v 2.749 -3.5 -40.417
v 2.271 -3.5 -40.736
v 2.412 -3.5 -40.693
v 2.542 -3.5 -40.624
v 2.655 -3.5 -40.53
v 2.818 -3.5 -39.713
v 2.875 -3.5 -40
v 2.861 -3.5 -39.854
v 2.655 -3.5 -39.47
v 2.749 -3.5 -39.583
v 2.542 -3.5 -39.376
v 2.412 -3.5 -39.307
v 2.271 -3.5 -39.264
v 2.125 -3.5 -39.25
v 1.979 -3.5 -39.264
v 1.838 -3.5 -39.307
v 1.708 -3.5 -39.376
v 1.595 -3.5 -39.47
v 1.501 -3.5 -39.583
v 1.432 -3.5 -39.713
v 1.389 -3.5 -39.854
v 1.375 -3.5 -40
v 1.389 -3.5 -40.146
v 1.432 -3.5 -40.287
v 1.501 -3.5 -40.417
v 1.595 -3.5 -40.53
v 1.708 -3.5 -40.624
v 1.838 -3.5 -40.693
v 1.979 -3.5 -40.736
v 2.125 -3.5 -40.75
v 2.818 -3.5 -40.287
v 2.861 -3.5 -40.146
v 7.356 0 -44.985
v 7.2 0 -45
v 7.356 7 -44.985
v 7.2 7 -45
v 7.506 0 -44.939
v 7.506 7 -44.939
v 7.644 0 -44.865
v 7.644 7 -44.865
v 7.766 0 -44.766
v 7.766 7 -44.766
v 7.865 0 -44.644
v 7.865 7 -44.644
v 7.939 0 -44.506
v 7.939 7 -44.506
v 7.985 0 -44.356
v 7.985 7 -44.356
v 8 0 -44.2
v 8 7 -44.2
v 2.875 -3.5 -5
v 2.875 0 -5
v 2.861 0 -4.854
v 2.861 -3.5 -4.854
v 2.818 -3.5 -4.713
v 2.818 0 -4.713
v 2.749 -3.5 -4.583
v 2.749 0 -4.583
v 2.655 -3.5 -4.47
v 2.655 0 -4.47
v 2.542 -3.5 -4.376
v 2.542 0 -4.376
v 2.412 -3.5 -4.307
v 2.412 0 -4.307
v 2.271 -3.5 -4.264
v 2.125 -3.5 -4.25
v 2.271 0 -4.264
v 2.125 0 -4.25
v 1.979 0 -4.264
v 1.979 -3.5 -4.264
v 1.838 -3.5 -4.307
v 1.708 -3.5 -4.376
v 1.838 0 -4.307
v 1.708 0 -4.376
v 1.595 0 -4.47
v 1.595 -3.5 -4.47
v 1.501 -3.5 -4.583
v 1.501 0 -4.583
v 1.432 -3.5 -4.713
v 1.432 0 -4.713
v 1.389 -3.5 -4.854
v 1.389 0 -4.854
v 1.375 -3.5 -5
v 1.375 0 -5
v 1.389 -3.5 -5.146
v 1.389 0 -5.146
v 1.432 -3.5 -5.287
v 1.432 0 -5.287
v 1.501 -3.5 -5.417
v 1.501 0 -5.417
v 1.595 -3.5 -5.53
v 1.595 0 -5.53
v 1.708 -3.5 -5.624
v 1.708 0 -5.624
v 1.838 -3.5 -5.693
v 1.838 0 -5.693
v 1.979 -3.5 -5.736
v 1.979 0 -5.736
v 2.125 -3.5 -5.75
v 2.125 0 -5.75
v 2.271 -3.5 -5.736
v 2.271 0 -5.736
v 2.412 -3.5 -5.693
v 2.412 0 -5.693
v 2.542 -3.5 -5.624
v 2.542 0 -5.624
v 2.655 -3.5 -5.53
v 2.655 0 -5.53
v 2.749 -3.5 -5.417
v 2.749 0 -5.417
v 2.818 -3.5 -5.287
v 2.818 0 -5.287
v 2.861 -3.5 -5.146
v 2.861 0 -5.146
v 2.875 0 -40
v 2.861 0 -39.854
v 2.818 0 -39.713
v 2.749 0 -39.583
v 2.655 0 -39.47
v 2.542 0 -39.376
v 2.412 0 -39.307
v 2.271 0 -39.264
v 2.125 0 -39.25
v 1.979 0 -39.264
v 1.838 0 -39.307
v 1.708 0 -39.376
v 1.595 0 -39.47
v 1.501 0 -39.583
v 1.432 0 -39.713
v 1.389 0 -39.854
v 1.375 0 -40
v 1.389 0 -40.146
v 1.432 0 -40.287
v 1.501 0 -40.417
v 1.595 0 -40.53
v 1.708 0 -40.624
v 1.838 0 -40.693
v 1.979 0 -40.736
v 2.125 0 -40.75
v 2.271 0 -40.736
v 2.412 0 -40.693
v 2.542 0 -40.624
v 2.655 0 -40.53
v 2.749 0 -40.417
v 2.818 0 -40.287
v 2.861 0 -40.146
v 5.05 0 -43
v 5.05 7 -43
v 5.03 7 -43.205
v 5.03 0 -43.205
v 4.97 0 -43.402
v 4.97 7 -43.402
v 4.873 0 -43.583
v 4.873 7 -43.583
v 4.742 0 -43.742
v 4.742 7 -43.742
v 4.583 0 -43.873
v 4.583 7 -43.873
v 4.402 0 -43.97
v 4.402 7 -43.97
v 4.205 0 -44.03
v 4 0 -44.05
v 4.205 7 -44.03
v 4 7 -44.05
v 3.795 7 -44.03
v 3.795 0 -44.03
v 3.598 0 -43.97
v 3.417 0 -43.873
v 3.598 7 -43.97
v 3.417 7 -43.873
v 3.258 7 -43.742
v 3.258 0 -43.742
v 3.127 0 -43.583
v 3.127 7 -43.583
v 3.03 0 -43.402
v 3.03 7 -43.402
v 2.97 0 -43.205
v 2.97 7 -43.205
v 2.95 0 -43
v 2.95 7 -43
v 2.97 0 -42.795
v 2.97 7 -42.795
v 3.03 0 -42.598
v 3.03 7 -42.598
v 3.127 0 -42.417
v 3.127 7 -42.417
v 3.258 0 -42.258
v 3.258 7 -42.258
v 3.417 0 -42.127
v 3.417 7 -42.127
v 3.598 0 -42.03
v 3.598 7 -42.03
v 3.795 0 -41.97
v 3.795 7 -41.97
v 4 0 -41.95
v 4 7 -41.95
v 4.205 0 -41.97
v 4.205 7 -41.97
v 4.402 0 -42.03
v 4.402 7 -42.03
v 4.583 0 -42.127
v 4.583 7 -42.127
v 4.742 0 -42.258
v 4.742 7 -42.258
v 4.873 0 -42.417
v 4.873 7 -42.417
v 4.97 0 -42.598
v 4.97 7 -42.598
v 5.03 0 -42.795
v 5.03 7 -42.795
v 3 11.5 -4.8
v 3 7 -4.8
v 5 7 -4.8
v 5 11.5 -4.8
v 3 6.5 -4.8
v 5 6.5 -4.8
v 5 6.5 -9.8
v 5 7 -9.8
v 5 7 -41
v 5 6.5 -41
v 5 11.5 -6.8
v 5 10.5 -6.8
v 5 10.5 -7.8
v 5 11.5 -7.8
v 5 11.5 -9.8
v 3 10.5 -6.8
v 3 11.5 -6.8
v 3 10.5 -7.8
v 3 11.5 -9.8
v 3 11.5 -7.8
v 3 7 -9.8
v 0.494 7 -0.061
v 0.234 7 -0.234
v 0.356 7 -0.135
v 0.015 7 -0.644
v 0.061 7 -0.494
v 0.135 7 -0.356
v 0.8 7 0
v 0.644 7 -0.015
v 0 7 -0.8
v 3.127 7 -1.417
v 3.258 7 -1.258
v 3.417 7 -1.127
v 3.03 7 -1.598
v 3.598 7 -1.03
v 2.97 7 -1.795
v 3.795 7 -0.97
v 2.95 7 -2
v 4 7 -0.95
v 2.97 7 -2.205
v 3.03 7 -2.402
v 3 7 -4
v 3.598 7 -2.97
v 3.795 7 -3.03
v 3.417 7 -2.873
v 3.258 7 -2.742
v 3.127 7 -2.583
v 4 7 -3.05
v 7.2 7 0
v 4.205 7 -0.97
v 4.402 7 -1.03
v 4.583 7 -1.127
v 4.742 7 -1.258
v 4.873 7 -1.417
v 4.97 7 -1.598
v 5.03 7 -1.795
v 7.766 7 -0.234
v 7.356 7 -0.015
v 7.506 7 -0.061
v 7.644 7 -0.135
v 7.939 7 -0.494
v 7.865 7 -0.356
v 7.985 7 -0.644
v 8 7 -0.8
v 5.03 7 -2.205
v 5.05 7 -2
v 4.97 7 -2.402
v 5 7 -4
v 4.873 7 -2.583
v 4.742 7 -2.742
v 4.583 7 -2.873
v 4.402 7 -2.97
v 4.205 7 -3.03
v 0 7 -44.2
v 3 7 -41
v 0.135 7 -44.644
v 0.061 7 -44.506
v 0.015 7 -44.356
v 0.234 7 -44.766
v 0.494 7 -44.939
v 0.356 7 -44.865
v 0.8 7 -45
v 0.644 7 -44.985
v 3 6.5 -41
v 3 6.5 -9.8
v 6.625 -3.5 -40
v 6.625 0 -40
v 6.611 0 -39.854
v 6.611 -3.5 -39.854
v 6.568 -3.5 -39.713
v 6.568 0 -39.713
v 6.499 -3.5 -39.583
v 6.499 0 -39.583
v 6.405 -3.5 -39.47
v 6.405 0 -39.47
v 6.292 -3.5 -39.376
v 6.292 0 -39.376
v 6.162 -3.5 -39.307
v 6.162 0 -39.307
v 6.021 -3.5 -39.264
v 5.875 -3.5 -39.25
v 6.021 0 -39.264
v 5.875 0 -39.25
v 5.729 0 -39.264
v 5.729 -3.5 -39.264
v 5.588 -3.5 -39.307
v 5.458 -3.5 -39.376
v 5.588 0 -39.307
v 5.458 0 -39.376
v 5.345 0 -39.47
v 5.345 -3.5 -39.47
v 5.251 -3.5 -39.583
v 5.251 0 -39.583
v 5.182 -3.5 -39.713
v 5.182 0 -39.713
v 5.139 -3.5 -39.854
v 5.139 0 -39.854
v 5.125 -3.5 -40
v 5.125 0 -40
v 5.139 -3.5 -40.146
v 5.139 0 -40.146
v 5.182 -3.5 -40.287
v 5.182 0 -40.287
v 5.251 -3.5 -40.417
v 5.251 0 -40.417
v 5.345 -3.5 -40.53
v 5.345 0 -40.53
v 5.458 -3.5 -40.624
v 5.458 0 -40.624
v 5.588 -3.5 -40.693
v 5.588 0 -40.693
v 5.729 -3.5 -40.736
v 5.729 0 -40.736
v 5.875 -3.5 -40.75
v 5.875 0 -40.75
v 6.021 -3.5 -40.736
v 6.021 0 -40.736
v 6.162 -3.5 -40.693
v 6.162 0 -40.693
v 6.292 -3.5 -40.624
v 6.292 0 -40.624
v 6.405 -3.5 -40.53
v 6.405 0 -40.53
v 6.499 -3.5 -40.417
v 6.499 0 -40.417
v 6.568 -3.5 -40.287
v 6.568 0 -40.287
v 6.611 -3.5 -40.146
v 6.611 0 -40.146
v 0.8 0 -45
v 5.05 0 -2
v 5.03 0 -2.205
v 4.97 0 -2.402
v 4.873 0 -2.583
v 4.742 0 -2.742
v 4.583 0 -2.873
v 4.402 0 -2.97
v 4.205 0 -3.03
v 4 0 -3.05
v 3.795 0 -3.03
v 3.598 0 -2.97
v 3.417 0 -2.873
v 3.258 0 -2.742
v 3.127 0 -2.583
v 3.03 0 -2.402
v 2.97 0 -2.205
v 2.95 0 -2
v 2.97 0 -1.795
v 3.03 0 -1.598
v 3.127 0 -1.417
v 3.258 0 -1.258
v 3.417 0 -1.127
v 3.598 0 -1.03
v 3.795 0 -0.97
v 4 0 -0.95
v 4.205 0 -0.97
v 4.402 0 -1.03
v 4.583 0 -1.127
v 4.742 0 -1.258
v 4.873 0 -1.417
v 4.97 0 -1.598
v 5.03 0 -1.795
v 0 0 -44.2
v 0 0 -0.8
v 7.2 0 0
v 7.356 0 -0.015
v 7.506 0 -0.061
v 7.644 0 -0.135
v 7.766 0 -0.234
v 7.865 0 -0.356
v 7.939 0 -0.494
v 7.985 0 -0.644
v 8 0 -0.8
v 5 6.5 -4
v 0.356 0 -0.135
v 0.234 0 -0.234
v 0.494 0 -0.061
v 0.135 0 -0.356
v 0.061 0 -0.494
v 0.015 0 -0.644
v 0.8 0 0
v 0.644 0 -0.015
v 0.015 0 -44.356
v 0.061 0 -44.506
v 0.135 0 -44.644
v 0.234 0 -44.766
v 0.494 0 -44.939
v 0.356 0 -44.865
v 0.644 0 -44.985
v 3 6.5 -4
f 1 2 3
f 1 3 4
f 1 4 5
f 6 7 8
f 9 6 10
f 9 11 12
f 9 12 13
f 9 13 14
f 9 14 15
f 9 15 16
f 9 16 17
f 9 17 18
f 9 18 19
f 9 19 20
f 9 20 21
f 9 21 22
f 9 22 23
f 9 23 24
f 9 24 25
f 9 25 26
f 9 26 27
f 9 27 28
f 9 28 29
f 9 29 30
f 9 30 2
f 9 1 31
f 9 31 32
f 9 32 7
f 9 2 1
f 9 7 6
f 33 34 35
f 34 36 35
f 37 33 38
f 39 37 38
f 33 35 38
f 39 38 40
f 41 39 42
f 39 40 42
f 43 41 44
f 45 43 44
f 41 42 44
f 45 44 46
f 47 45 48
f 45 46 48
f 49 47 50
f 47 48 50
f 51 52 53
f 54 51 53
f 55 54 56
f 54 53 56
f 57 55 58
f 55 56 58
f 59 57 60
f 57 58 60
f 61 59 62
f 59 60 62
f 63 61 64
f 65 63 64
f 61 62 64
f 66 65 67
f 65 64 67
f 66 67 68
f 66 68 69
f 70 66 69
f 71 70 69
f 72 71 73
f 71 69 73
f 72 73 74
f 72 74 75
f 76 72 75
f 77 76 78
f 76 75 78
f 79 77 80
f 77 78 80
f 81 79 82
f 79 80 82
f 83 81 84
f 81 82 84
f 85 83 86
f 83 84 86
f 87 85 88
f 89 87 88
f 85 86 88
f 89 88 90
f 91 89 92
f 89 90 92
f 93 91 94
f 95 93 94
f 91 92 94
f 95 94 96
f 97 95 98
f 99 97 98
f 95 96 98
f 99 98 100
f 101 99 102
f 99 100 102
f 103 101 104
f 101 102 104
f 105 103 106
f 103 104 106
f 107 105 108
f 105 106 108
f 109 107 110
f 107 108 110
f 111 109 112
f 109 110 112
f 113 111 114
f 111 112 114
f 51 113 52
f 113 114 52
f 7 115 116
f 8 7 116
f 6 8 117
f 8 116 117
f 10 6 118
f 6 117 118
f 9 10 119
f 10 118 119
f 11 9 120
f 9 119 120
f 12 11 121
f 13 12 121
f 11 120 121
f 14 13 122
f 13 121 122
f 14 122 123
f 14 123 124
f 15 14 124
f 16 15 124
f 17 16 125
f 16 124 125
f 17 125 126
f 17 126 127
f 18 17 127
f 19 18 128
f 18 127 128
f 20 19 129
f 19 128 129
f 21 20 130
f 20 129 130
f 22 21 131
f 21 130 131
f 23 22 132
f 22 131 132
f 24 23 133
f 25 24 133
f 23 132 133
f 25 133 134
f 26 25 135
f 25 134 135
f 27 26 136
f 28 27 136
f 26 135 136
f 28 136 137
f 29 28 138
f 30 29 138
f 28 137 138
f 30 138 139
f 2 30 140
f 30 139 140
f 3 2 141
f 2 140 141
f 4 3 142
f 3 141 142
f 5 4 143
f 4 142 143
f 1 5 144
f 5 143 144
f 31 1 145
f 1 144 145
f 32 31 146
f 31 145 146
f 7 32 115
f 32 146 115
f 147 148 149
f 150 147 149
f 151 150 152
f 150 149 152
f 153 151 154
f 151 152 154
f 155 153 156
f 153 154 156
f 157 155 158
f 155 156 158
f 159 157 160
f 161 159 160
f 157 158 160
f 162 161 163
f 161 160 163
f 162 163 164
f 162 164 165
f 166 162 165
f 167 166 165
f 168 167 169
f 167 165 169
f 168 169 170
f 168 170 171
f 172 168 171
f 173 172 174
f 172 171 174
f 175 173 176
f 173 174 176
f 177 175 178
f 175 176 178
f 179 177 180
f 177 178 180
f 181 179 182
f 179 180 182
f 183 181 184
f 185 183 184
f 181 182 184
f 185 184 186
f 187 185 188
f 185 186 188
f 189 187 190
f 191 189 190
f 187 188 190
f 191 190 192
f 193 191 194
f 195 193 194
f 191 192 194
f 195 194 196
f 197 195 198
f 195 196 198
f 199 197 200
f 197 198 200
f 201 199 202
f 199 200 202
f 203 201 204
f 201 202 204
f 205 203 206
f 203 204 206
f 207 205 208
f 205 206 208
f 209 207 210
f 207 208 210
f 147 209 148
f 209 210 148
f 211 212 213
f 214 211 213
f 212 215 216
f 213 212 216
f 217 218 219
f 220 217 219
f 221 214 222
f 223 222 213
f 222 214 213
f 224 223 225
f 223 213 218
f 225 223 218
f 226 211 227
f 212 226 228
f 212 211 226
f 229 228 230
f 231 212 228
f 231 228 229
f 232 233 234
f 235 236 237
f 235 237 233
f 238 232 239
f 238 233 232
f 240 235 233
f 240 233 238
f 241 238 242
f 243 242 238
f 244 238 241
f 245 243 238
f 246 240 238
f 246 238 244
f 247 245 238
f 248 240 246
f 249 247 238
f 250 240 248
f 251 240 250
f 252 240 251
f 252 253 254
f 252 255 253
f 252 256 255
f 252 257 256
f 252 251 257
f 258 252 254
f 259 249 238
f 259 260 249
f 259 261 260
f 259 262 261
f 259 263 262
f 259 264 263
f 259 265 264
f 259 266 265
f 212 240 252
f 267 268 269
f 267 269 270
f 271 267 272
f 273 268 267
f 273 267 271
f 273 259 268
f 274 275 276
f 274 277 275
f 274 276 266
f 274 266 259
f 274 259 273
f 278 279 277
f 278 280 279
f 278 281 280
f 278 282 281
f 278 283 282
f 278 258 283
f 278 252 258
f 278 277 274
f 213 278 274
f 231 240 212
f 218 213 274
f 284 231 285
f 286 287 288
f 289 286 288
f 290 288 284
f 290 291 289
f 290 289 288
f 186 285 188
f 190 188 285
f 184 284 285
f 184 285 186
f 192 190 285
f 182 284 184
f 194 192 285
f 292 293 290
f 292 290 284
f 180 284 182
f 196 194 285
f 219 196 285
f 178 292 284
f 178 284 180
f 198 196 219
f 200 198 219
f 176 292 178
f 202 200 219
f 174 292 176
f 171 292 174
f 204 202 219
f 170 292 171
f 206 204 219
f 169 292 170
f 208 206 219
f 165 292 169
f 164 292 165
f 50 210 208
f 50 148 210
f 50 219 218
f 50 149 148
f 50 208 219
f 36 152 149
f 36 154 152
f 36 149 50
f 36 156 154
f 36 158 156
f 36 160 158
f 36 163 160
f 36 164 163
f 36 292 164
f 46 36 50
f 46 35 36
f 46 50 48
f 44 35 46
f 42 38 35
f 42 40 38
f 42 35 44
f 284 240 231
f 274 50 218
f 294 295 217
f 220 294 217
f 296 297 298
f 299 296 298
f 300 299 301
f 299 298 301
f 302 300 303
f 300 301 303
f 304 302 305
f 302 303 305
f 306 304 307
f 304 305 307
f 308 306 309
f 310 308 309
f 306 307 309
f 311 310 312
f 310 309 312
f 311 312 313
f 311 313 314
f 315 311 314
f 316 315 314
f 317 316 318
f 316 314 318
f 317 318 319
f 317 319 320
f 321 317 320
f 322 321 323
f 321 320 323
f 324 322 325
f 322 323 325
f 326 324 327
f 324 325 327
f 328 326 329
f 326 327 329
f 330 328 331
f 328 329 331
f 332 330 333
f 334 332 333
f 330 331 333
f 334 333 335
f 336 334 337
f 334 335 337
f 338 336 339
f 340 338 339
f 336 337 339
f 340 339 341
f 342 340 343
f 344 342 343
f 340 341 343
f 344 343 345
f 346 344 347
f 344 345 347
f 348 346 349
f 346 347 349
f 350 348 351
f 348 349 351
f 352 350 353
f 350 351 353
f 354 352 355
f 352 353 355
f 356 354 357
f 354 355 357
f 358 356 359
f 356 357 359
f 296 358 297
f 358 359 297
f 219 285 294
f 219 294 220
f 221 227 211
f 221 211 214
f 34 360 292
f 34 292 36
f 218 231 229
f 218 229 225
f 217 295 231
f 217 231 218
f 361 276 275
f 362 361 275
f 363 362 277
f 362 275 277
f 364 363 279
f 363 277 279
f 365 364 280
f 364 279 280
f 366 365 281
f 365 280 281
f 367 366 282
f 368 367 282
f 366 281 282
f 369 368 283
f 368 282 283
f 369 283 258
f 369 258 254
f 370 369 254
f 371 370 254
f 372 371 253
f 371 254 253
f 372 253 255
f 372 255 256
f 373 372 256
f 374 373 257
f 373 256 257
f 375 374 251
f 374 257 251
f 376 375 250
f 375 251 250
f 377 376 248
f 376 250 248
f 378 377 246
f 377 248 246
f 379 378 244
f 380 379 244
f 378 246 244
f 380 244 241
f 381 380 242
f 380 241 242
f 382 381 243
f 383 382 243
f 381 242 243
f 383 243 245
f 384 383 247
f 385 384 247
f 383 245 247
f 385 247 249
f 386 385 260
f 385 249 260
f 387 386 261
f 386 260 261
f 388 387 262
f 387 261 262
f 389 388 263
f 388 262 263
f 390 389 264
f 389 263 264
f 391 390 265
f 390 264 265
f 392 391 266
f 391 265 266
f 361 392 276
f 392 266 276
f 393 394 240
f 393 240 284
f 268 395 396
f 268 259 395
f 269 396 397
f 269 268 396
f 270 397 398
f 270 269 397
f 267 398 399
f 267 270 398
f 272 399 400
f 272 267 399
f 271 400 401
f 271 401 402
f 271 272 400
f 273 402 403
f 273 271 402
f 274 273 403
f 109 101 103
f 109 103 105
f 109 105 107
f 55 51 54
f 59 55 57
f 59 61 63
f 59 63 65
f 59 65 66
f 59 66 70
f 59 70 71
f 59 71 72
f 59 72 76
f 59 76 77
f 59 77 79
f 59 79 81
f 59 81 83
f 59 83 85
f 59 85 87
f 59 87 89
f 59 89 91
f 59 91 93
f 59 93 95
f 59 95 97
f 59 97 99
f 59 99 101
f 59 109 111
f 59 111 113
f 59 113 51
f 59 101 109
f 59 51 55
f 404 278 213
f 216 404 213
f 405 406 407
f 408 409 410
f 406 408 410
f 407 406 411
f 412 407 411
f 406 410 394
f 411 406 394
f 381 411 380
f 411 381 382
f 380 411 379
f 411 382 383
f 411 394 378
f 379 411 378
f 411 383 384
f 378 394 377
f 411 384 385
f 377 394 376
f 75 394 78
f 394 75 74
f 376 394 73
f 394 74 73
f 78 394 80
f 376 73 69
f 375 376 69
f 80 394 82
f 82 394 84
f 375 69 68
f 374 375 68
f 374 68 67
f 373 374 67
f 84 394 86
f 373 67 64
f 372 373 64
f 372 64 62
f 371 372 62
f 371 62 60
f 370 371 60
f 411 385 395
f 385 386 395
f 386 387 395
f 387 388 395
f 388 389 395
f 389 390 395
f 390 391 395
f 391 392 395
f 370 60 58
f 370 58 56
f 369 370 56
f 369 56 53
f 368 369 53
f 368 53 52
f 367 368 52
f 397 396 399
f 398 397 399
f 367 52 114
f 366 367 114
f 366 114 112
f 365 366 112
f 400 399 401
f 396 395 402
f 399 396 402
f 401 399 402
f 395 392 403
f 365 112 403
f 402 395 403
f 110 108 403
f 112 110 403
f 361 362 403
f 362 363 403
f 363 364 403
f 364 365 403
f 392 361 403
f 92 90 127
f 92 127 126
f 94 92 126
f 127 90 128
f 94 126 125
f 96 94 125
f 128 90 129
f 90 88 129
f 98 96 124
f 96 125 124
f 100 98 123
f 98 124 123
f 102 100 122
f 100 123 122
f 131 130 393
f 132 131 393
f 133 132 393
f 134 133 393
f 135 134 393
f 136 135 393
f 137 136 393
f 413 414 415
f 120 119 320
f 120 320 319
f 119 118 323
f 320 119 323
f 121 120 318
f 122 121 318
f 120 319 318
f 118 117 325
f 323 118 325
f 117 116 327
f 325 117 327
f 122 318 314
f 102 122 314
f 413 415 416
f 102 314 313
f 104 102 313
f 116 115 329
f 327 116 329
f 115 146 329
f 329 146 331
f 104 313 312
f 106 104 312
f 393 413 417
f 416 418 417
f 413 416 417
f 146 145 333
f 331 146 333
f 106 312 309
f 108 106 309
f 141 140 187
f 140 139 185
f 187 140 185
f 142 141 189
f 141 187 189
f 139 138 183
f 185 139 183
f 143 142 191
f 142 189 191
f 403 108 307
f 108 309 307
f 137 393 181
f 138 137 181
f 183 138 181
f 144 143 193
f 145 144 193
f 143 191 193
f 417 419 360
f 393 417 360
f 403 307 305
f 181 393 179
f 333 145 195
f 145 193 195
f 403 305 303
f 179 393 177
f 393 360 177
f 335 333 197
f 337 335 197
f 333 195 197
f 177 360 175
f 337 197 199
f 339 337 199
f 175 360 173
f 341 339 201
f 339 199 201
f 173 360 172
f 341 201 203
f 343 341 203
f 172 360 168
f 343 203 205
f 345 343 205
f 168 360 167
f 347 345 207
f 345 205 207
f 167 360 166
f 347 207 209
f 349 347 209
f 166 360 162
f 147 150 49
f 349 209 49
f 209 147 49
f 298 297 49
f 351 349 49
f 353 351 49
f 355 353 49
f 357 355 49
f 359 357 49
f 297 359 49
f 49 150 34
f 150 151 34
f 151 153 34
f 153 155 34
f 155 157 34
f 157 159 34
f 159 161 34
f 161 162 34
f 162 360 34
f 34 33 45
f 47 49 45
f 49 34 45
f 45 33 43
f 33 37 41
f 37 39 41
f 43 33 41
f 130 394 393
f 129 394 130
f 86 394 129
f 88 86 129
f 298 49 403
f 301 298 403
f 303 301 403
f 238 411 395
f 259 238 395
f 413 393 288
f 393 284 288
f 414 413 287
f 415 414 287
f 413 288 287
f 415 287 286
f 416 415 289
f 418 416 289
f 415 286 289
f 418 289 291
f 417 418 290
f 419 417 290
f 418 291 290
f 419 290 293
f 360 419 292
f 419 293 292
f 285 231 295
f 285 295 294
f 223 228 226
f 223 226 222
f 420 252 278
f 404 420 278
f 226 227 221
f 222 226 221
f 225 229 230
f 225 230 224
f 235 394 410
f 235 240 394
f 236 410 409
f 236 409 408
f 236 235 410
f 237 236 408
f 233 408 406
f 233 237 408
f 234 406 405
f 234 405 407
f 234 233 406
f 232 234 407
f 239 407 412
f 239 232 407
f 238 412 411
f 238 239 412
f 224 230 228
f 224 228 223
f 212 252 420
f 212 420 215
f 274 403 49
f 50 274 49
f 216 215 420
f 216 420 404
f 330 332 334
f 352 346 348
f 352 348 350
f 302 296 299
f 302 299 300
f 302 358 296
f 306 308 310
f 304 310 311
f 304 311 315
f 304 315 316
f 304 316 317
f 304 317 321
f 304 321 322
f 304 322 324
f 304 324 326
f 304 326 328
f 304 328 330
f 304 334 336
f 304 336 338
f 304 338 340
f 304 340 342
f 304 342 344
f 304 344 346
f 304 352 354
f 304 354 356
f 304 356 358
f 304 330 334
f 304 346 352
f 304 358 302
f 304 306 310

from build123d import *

# Parameters (mm, degrees)
SZKIC1_W                    = 8
SZKIC1_H                    = 45
DODANIE_WYCI_GNI_CIE1_DEPTH = 7
SZKIC2_R                    = 1.05
WYTNIJ_WYCI_GNI_CIE1_DEPTH  = 7
SZKIC3_W                    = 2
SZKIC3_H                    = 37
WYTNIJ_WYCI_GNI_CIE2_DEPTH  = 0.5
SZKIC4_W                    = 2
SZKIC4_H                    = 5
DODANIE_WYCI_GNI_CIE4_DEPTH = 5
SZKIC13_R                   = 0.75
DODANIE_WYCI_GNI_CIE7_DEPTH = 3.5
ZAOKR_GLENIE1_R             = 0.8
SZKIC14_W                   = 2
SZKIC14_H                   = 1
WYTNIJ_WYCI_GNI_CIE3_DEPTH  = 1


with BuildPart() as part:
    # Szkic1 → Dodanie-wyciągnięcie1 (new body)
    with BuildSketch(Plane(origin=(0, 0, 0), x_dir=(1, 0, 0), z_dir=(0, 1, 0))):
        with Locations((4, 22.5)):
            Rectangle(SZKIC1_W, SZKIC1_H)
    extrude(amount=DODANIE_WYCI_GNI_CIE1_DEPTH)

    # Szkic2 → Wytnij-wyciągnięcie1 (cut)
    with BuildSketch(Plane(origin=(0, 7, 0), x_dir=(1, 0, 0), z_dir=(0, 1, 0))):
        with Locations((4, 2)):
            Circle(SZKIC2_R)
        with Locations((4, 43)):
            Circle(SZKIC2_R)
    extrude(amount=-WYTNIJ_WYCI_GNI_CIE1_DEPTH, mode=Mode.SUBTRACT)

    # Szkic3 → Wytnij-wyciągnięcie2 (cut)
    with BuildSketch(Plane(origin=(0, 7, 0), x_dir=(1, 0, 0), z_dir=(0, 1, 0))):
        with Locations((4, 22.5)):
            Rectangle(SZKIC3_W, SZKIC3_H)
    extrude(amount=-WYTNIJ_WYCI_GNI_CIE2_DEPTH, mode=Mode.SUBTRACT)

    # Szkic4 → Dodanie-wyciągnięcie4 (add)
    with BuildSketch(Plane(origin=(0, 6.5, 0), x_dir=(1, 0, 0), z_dir=(0, 1, 0))):
        with Locations((4, 7.3)):
            Rectangle(SZKIC4_W, SZKIC4_H)
    extrude(amount=DODANIE_WYCI_GNI_CIE4_DEPTH)

    # Szkic13 → Dodanie-wyciągnięcie7 (add)
    with BuildSketch(Plane.XZ):
        with Locations((2.125, -40)):
            Circle(SZKIC13_R)
        with Locations((5.875, -40)):
            Circle(SZKIC13_R)
        with Locations((2.125, -5)):
            Circle(SZKIC13_R)
    extrude(amount=DODANIE_WYCI_GNI_CIE7_DEPTH)

    # Zaokrąglenie1
    zaokr_glenie1_edges = [part.edges().sort_by_distance(p)[0] for p in [
        (0, 3.5, -45),
        (8, 3.5, -45),
        (8, 3.5, 0),
        (0, 3.5, 0),
    ]]
    fillet(zaokr_glenie1_edges, radius=ZAOKR_GLENIE1_R)

    # Szkic14 → Wytnij-wyciągnięcie3 (cut)
    with BuildSketch(Plane(origin=(0, 11.5, 0), x_dir=(1, 0, 0), z_dir=(0, 1, 0))):
        with Locations((4, 7.3)):
            Rectangle(SZKIC14_W, SZKIC14_H)
    extrude(amount=-WYTNIJ_WYCI_GNI_CIE3_DEPTH, mode=Mode.SUBTRACT)


solid = part.part
